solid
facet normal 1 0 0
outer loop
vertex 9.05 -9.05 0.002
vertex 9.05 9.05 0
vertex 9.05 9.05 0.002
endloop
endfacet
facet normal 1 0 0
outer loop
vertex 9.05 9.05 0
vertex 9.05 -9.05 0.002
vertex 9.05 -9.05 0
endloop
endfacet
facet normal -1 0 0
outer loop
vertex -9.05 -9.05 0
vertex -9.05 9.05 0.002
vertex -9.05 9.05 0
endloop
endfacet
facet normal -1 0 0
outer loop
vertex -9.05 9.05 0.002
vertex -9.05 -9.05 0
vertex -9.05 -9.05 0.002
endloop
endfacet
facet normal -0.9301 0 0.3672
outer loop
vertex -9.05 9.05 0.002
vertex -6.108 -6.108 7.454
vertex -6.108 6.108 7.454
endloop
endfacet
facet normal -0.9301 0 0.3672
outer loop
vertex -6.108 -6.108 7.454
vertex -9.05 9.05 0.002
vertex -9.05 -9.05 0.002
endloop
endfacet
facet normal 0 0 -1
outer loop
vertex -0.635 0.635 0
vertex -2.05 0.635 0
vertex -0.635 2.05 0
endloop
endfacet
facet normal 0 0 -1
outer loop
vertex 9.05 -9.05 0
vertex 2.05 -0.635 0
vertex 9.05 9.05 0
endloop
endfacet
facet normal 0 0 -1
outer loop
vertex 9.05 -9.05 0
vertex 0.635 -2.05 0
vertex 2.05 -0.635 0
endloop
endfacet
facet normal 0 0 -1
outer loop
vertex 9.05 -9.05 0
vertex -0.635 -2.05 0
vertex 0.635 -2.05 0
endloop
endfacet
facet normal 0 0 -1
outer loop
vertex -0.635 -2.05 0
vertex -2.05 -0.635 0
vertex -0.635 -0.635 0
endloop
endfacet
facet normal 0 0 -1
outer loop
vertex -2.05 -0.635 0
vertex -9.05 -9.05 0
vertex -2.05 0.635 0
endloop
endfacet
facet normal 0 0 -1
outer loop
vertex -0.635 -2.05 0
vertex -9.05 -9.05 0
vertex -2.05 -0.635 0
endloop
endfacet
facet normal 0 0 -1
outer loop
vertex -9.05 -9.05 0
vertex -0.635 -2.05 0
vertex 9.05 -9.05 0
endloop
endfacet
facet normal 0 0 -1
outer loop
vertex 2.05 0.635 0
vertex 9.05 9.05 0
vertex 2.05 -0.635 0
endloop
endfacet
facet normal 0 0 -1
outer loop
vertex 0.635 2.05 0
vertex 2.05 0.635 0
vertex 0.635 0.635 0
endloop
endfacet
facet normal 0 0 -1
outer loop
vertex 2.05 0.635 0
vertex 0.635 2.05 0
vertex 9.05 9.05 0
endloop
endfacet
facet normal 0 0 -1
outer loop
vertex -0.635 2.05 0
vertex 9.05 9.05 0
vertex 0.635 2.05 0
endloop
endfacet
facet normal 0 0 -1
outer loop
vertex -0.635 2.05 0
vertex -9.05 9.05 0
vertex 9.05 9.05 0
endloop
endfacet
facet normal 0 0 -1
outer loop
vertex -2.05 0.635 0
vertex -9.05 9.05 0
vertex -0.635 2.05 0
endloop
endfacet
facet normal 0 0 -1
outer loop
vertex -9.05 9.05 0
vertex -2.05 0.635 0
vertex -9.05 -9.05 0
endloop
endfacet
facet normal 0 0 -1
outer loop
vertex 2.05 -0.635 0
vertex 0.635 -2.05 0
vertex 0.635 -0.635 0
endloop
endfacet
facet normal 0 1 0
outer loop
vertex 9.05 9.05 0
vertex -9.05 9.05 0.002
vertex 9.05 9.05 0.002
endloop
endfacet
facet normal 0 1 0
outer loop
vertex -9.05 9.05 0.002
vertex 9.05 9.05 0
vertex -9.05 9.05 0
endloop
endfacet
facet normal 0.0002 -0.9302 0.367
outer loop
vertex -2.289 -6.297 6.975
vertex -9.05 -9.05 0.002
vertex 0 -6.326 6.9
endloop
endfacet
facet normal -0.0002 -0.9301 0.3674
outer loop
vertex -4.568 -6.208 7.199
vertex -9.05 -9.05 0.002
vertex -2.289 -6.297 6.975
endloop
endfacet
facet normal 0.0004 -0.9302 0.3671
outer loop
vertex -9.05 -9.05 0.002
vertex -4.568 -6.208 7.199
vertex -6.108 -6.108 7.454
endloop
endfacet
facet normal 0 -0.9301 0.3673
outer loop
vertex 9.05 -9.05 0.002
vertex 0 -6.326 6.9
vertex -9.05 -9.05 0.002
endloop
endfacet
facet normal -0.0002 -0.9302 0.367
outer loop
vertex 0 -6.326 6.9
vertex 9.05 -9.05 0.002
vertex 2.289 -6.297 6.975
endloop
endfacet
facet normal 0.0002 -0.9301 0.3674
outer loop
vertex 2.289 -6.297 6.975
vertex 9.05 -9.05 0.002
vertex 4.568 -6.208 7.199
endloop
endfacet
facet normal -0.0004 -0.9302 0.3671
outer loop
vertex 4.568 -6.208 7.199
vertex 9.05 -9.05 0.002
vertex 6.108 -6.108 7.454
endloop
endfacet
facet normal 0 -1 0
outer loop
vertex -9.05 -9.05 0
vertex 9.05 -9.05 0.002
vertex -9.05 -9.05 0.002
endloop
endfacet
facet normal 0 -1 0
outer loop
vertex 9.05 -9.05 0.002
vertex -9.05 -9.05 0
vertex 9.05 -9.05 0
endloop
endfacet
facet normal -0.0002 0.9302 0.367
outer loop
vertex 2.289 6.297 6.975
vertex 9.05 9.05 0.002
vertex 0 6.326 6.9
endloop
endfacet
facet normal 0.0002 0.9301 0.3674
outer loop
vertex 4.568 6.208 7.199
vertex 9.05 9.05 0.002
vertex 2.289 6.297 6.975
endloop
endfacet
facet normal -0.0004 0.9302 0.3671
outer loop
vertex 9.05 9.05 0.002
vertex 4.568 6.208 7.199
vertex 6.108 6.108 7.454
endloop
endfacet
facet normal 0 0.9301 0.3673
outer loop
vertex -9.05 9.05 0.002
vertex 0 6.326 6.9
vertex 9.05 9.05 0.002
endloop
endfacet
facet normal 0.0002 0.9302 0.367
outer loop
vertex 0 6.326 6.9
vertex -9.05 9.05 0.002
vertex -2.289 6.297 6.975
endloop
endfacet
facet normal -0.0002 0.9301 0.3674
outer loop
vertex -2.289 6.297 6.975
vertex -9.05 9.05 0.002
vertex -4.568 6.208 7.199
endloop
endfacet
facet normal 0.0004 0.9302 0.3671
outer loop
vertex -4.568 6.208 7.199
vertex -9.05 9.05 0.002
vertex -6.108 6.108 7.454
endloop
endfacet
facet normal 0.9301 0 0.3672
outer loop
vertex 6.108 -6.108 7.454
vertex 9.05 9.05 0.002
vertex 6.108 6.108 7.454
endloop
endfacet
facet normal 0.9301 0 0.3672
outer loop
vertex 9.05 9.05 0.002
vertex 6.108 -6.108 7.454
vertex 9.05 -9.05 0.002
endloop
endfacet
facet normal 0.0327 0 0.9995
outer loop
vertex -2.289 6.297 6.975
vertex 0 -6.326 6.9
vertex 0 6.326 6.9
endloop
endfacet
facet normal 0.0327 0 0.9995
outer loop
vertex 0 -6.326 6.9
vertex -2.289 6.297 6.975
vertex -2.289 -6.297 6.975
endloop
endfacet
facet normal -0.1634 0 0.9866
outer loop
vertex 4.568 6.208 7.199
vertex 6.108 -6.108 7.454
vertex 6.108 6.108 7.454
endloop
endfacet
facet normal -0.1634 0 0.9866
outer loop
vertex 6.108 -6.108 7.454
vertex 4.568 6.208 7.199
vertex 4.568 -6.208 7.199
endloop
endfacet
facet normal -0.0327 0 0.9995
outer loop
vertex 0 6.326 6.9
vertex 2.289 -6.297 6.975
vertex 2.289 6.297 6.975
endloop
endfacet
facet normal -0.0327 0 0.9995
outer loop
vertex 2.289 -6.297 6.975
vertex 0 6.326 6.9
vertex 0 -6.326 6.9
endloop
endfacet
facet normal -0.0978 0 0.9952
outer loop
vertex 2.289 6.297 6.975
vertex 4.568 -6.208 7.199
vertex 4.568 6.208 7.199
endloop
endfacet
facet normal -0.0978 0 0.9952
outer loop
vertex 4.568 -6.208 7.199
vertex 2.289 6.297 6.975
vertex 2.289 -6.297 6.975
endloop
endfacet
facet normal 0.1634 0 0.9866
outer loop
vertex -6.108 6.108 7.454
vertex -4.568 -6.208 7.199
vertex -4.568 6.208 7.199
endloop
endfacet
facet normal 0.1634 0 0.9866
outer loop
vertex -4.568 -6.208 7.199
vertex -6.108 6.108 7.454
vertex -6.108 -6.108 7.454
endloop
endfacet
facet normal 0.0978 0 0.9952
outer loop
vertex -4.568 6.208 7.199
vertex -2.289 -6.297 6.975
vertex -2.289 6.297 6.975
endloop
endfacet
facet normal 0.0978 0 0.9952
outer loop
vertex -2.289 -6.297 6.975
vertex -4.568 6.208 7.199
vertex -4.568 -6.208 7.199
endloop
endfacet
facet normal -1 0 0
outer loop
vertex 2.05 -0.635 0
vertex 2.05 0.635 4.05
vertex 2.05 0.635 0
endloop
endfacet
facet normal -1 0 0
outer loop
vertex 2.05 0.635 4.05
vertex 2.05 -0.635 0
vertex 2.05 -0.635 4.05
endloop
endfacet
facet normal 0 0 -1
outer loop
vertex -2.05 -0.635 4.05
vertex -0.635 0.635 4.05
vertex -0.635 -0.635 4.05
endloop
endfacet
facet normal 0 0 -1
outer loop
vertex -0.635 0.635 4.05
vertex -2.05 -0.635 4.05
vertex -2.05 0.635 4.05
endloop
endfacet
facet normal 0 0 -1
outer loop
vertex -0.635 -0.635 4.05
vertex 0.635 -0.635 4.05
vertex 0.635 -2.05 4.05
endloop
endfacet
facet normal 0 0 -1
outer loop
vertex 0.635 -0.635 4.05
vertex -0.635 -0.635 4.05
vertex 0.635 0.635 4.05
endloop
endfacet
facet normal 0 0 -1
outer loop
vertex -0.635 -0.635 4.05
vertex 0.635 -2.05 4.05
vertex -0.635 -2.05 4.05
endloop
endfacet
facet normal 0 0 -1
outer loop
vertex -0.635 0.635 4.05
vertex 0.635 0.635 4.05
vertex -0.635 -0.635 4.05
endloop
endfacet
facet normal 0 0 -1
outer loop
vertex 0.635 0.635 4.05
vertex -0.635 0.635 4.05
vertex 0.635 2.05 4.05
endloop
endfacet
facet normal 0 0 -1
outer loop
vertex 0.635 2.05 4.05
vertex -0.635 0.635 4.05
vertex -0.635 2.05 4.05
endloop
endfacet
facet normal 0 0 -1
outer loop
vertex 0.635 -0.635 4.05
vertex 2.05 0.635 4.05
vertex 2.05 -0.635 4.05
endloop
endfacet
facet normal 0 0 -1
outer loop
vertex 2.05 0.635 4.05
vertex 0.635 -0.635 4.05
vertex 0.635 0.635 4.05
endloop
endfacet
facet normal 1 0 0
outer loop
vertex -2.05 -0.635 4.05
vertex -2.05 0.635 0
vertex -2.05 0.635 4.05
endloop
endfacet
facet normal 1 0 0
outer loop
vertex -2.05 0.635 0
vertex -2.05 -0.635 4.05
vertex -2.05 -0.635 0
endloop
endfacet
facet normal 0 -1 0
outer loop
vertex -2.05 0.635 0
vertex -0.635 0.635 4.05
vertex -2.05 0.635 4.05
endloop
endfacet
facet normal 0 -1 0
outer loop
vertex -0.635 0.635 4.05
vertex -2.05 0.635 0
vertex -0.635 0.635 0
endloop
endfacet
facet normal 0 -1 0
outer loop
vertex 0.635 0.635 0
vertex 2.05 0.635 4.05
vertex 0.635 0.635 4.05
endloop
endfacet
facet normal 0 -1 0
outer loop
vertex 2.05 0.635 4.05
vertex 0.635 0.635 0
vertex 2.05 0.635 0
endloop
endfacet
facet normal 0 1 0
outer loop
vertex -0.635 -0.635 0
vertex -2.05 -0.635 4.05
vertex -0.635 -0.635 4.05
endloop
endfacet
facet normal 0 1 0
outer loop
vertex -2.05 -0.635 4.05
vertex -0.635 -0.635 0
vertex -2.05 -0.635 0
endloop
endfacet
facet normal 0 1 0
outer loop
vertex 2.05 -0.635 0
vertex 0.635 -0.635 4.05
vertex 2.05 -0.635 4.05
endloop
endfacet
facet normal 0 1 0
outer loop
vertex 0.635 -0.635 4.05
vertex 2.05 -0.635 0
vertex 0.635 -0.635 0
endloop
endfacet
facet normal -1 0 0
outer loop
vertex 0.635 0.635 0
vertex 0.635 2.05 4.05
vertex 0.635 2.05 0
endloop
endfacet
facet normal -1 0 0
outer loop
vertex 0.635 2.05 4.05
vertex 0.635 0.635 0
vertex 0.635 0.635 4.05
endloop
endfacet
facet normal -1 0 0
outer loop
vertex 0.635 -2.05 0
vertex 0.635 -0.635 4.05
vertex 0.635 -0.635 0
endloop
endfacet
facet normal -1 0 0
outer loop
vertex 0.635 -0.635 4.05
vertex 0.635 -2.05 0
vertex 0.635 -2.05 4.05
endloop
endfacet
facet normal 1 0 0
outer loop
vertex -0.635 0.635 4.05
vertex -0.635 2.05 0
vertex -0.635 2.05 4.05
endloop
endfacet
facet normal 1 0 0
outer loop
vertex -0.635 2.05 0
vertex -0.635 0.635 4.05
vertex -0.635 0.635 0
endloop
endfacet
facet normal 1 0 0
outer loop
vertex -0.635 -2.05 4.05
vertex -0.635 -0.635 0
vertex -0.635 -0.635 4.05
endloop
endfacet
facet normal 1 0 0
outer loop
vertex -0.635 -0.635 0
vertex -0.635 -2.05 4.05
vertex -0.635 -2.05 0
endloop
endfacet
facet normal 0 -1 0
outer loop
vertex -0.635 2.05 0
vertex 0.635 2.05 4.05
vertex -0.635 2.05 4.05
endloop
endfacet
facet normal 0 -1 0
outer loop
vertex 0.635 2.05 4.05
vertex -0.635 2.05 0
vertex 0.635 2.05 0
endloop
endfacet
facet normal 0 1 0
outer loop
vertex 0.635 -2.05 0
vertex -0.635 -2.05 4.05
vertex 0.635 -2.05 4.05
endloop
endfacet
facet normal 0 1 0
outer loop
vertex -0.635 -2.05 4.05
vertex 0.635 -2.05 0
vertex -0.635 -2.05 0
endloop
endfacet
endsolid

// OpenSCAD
// =====================================================
// Parametric Silver Keycap Library
// Features: hollow, legend engraving, multi-size, 5 profiles
// Units: millimeters
// =====================================================

// ---- Top-level parameters (override via openscad -D) ----
key_units      = 1.0;        // 1, 1.25, 1.5, 1.75, 2, 2.25, 2.75, 6.25
profile        = "cherry";   // "cherry" | "oem" | "sa" | "dsa" | "xda"
row            = 3;          // R1..R4 — only used by sculpted profiles
hollow         = false;
wall_thickness = 1.0;        // outer wall + top wall; minimum castable in 925 silver ≈ 0.6mm
legend         = "";         // "" = no engraving
legend_depth   = 0.45;
legend_size    = 7;
legend_font    = "Helvetica:style=Bold";
cutaway        = false;      // true → cut in half along XZ plane (y>=0 kept)
flat_top       = false;      // true → no dish curvature on top (overrides profile dish)
shrink_compensation = 1.0;   // scale factor: 1.018 ≈ 1.8% upscale for silver casting shrinkage

// ---- Constants ----
unit_pitch     = 19.05;
gap            = 0.95;
cross_w        = 4.10;
cross_t        = 1.27;
cross_d        = 4.0;
stem_wall      = 0.7;        // side wall around the cross slot (perpendicular to arm)
stem_arm_long  = cross_w;                  // 4.10mm — stem arm length = cross arm length (NO end caps)
stem_arm_short = cross_t + 2 * stem_wall;  // 2.67mm — side walls only
stab_off_2u    = 11.94;
stab_off_625   = 50.0;
stab_off_7u    = 57.0;

$fn = 96;

// ---- Profile registry ----
function spec(p, r) =
    p == "cherry" ? [ r == 1 ? 9.4 : r == 2 ? 8.7 : r == 3 ? 7.6 : 7.6,
                      3.0, 35, 0.7, "cyl" ]
  : p == "oem"    ? [ r == 1 ? 11.9 : r == 2 ? 11.0 : r == 3 ? 9.8 : 10.6,
                      3.0, 50, 0.7, "cyl" ]
  : p == "sa"     ? [ r == 1 ? 12.9 : r == 2 ? 12.0 : r == 3 ? 11.4 : 12.6,
                      4.5, 22, 1.5, "sph" ]
  : p == "dsa"    ? [ 7.4, 4.0, 22, 1.0, "sph" ]
  : p == "xda"    ? [ 9.2, 2.5, 26, 0.9, "sph" ]
  :                 [ 9.5, 3.0, 35, 0.7, "cyl" ];

specs    = spec(profile, row);
height   = specs[0];
top_in   = specs[1];
dish_r   = specs[2];
dish_d   = flat_top ? 0 : specs[3];
dish_typ = specs[4];

base_x = key_units * unit_pitch - gap;
base_y = unit_pitch - gap;
top_x  = base_x - 2 * top_in;
top_y  = base_y - 2 * top_in;

// ---- Modules ----
module outer_shell() {
    hull() {
        translate([0, 0, 0.001])         cube([base_x, base_y, 0.002], center=true);
        translate([0, 0, height - 0.001]) cube([top_x, top_y, 0.002], center=true);
    }
}

module inner_void() {
    // Open-bottom cavity with UNIFORM wall_thickness everywhere — top wall follows dish curvature.
    // Construction: base frustum extends up to (height - wall_thickness) at edges, then a
    // shifted dish-shape (offset down by wall_thickness) carves the curve into the ceiling.
    void_top_flat = height - wall_thickness;
    if (void_top_flat > 0.5) {
        difference() {
            hull() {
                translate([0, 0, -0.1])
                    cube([max(base_x - 2*wall_thickness, 1), max(base_y - 2*wall_thickness, 1), 0.001], center=true);
                translate([0, 0, void_top_flat])
                    cube([max(top_x - 2*wall_thickness, 1), max(top_y - 2*wall_thickness, 1), 0.001], center=true);
            }
            if (dish_d > 0) {
                if (dish_typ == "cyl") {
                    translate([0, 0, height - dish_d + dish_r - wall_thickness])
                        rotate([90, 0, 0])
                            cylinder(r=dish_r, h=base_y * 3, center=true);
                } else {
                    translate([0, 0, height - dish_d + dish_r - wall_thickness])
                        sphere(r=dish_r);
                }
            }
        }
    }
}

module dish_neg() {
    if (dish_d > 0) {
        if (dish_typ == "cyl") {
            translate([0, 0, height - dish_d + dish_r])
                rotate([90, 0, 0])
                    cylinder(r=dish_r, h=base_y * 3, center=true);
        } else {
            translate([0, 0, height - dish_d + dish_r])
                sphere(r=dish_r);
        }
    }
}

module mx_cross_neg() {
    // Hollow caps: cross extends nearly to underside of top wall (matches injection-molded keycap norm).
    // Solid caps: keep standard 4mm depth.
    ch = hollow ? (height - dish_d - wall_thickness - 0.4) : cross_d;
    translate([0, 0, -0.05])
        union() {
            translate([-cross_w/2, -cross_t/2, 0])
                cube([cross_w, cross_t, ch + 0.1]);
            translate([-cross_t/2, -cross_w/2, 0])
                cube([cross_t, cross_w, ch + 0.1]);
        }
}

module stem_boss_pos() {
    // "+" stem with side walls only — no end caps at the arm tips.
    // Arm length matches the cross slot exactly; side walls are 0.7mm thick.
    h = height - dish_d - wall_thickness + 0.6;
    union() {
        translate([-stem_arm_long/2, -stem_arm_short/2, 0])
            cube([stem_arm_long, stem_arm_short, h]);
        translate([-stem_arm_short/2, -stem_arm_long/2, 0])
            cube([stem_arm_short, stem_arm_long, h]);
    }
}

module stabilizers(units) {
    off = units >= 7    ? stab_off_7u
        : units >= 6.25 ? stab_off_625
        : units >= 2    ? stab_off_2u
        : 0;
    if (off > 0) {
        translate([ off, 0, 0]) children();
        translate([-off, 0, 0]) children();
    }
}

module legend_neg() {
    if (len(legend) > 0) {
        // place text-cutting prism above the keycap, extending down past dish bottom
        // by `legend_depth`, so engraving depth ≈ legend_depth measured from top surface
        translate([0, 0, height - dish_d - legend_depth])
            linear_extrude(height)
                text(legend, size=legend_size, font=legend_font,
                     halign="center", valign="center");
    }
}

module keycap() {
    difference() {
        union() {
            difference() {
                outer_shell();
                dish_neg();
                if (hollow) inner_void();
            }
            // re-add solid stem boss for hollow caps so MX stem grips
            if (hollow) {
                stem_boss_pos();
                stabilizers(key_units) stem_boss_pos();
            }
        }
        mx_cross_neg();
        stabilizers(key_units) mx_cross_neg();
        legend_neg();
    }
}

scale([shrink_compensation, shrink_compensation, shrink_compensation]) {
    if (cutaway) {
        intersection() {
            keycap();
            translate([0, 100, 0])
                cube([500, 200, 200], center=true);
        }
    } else {
        keycap();
    }
}
